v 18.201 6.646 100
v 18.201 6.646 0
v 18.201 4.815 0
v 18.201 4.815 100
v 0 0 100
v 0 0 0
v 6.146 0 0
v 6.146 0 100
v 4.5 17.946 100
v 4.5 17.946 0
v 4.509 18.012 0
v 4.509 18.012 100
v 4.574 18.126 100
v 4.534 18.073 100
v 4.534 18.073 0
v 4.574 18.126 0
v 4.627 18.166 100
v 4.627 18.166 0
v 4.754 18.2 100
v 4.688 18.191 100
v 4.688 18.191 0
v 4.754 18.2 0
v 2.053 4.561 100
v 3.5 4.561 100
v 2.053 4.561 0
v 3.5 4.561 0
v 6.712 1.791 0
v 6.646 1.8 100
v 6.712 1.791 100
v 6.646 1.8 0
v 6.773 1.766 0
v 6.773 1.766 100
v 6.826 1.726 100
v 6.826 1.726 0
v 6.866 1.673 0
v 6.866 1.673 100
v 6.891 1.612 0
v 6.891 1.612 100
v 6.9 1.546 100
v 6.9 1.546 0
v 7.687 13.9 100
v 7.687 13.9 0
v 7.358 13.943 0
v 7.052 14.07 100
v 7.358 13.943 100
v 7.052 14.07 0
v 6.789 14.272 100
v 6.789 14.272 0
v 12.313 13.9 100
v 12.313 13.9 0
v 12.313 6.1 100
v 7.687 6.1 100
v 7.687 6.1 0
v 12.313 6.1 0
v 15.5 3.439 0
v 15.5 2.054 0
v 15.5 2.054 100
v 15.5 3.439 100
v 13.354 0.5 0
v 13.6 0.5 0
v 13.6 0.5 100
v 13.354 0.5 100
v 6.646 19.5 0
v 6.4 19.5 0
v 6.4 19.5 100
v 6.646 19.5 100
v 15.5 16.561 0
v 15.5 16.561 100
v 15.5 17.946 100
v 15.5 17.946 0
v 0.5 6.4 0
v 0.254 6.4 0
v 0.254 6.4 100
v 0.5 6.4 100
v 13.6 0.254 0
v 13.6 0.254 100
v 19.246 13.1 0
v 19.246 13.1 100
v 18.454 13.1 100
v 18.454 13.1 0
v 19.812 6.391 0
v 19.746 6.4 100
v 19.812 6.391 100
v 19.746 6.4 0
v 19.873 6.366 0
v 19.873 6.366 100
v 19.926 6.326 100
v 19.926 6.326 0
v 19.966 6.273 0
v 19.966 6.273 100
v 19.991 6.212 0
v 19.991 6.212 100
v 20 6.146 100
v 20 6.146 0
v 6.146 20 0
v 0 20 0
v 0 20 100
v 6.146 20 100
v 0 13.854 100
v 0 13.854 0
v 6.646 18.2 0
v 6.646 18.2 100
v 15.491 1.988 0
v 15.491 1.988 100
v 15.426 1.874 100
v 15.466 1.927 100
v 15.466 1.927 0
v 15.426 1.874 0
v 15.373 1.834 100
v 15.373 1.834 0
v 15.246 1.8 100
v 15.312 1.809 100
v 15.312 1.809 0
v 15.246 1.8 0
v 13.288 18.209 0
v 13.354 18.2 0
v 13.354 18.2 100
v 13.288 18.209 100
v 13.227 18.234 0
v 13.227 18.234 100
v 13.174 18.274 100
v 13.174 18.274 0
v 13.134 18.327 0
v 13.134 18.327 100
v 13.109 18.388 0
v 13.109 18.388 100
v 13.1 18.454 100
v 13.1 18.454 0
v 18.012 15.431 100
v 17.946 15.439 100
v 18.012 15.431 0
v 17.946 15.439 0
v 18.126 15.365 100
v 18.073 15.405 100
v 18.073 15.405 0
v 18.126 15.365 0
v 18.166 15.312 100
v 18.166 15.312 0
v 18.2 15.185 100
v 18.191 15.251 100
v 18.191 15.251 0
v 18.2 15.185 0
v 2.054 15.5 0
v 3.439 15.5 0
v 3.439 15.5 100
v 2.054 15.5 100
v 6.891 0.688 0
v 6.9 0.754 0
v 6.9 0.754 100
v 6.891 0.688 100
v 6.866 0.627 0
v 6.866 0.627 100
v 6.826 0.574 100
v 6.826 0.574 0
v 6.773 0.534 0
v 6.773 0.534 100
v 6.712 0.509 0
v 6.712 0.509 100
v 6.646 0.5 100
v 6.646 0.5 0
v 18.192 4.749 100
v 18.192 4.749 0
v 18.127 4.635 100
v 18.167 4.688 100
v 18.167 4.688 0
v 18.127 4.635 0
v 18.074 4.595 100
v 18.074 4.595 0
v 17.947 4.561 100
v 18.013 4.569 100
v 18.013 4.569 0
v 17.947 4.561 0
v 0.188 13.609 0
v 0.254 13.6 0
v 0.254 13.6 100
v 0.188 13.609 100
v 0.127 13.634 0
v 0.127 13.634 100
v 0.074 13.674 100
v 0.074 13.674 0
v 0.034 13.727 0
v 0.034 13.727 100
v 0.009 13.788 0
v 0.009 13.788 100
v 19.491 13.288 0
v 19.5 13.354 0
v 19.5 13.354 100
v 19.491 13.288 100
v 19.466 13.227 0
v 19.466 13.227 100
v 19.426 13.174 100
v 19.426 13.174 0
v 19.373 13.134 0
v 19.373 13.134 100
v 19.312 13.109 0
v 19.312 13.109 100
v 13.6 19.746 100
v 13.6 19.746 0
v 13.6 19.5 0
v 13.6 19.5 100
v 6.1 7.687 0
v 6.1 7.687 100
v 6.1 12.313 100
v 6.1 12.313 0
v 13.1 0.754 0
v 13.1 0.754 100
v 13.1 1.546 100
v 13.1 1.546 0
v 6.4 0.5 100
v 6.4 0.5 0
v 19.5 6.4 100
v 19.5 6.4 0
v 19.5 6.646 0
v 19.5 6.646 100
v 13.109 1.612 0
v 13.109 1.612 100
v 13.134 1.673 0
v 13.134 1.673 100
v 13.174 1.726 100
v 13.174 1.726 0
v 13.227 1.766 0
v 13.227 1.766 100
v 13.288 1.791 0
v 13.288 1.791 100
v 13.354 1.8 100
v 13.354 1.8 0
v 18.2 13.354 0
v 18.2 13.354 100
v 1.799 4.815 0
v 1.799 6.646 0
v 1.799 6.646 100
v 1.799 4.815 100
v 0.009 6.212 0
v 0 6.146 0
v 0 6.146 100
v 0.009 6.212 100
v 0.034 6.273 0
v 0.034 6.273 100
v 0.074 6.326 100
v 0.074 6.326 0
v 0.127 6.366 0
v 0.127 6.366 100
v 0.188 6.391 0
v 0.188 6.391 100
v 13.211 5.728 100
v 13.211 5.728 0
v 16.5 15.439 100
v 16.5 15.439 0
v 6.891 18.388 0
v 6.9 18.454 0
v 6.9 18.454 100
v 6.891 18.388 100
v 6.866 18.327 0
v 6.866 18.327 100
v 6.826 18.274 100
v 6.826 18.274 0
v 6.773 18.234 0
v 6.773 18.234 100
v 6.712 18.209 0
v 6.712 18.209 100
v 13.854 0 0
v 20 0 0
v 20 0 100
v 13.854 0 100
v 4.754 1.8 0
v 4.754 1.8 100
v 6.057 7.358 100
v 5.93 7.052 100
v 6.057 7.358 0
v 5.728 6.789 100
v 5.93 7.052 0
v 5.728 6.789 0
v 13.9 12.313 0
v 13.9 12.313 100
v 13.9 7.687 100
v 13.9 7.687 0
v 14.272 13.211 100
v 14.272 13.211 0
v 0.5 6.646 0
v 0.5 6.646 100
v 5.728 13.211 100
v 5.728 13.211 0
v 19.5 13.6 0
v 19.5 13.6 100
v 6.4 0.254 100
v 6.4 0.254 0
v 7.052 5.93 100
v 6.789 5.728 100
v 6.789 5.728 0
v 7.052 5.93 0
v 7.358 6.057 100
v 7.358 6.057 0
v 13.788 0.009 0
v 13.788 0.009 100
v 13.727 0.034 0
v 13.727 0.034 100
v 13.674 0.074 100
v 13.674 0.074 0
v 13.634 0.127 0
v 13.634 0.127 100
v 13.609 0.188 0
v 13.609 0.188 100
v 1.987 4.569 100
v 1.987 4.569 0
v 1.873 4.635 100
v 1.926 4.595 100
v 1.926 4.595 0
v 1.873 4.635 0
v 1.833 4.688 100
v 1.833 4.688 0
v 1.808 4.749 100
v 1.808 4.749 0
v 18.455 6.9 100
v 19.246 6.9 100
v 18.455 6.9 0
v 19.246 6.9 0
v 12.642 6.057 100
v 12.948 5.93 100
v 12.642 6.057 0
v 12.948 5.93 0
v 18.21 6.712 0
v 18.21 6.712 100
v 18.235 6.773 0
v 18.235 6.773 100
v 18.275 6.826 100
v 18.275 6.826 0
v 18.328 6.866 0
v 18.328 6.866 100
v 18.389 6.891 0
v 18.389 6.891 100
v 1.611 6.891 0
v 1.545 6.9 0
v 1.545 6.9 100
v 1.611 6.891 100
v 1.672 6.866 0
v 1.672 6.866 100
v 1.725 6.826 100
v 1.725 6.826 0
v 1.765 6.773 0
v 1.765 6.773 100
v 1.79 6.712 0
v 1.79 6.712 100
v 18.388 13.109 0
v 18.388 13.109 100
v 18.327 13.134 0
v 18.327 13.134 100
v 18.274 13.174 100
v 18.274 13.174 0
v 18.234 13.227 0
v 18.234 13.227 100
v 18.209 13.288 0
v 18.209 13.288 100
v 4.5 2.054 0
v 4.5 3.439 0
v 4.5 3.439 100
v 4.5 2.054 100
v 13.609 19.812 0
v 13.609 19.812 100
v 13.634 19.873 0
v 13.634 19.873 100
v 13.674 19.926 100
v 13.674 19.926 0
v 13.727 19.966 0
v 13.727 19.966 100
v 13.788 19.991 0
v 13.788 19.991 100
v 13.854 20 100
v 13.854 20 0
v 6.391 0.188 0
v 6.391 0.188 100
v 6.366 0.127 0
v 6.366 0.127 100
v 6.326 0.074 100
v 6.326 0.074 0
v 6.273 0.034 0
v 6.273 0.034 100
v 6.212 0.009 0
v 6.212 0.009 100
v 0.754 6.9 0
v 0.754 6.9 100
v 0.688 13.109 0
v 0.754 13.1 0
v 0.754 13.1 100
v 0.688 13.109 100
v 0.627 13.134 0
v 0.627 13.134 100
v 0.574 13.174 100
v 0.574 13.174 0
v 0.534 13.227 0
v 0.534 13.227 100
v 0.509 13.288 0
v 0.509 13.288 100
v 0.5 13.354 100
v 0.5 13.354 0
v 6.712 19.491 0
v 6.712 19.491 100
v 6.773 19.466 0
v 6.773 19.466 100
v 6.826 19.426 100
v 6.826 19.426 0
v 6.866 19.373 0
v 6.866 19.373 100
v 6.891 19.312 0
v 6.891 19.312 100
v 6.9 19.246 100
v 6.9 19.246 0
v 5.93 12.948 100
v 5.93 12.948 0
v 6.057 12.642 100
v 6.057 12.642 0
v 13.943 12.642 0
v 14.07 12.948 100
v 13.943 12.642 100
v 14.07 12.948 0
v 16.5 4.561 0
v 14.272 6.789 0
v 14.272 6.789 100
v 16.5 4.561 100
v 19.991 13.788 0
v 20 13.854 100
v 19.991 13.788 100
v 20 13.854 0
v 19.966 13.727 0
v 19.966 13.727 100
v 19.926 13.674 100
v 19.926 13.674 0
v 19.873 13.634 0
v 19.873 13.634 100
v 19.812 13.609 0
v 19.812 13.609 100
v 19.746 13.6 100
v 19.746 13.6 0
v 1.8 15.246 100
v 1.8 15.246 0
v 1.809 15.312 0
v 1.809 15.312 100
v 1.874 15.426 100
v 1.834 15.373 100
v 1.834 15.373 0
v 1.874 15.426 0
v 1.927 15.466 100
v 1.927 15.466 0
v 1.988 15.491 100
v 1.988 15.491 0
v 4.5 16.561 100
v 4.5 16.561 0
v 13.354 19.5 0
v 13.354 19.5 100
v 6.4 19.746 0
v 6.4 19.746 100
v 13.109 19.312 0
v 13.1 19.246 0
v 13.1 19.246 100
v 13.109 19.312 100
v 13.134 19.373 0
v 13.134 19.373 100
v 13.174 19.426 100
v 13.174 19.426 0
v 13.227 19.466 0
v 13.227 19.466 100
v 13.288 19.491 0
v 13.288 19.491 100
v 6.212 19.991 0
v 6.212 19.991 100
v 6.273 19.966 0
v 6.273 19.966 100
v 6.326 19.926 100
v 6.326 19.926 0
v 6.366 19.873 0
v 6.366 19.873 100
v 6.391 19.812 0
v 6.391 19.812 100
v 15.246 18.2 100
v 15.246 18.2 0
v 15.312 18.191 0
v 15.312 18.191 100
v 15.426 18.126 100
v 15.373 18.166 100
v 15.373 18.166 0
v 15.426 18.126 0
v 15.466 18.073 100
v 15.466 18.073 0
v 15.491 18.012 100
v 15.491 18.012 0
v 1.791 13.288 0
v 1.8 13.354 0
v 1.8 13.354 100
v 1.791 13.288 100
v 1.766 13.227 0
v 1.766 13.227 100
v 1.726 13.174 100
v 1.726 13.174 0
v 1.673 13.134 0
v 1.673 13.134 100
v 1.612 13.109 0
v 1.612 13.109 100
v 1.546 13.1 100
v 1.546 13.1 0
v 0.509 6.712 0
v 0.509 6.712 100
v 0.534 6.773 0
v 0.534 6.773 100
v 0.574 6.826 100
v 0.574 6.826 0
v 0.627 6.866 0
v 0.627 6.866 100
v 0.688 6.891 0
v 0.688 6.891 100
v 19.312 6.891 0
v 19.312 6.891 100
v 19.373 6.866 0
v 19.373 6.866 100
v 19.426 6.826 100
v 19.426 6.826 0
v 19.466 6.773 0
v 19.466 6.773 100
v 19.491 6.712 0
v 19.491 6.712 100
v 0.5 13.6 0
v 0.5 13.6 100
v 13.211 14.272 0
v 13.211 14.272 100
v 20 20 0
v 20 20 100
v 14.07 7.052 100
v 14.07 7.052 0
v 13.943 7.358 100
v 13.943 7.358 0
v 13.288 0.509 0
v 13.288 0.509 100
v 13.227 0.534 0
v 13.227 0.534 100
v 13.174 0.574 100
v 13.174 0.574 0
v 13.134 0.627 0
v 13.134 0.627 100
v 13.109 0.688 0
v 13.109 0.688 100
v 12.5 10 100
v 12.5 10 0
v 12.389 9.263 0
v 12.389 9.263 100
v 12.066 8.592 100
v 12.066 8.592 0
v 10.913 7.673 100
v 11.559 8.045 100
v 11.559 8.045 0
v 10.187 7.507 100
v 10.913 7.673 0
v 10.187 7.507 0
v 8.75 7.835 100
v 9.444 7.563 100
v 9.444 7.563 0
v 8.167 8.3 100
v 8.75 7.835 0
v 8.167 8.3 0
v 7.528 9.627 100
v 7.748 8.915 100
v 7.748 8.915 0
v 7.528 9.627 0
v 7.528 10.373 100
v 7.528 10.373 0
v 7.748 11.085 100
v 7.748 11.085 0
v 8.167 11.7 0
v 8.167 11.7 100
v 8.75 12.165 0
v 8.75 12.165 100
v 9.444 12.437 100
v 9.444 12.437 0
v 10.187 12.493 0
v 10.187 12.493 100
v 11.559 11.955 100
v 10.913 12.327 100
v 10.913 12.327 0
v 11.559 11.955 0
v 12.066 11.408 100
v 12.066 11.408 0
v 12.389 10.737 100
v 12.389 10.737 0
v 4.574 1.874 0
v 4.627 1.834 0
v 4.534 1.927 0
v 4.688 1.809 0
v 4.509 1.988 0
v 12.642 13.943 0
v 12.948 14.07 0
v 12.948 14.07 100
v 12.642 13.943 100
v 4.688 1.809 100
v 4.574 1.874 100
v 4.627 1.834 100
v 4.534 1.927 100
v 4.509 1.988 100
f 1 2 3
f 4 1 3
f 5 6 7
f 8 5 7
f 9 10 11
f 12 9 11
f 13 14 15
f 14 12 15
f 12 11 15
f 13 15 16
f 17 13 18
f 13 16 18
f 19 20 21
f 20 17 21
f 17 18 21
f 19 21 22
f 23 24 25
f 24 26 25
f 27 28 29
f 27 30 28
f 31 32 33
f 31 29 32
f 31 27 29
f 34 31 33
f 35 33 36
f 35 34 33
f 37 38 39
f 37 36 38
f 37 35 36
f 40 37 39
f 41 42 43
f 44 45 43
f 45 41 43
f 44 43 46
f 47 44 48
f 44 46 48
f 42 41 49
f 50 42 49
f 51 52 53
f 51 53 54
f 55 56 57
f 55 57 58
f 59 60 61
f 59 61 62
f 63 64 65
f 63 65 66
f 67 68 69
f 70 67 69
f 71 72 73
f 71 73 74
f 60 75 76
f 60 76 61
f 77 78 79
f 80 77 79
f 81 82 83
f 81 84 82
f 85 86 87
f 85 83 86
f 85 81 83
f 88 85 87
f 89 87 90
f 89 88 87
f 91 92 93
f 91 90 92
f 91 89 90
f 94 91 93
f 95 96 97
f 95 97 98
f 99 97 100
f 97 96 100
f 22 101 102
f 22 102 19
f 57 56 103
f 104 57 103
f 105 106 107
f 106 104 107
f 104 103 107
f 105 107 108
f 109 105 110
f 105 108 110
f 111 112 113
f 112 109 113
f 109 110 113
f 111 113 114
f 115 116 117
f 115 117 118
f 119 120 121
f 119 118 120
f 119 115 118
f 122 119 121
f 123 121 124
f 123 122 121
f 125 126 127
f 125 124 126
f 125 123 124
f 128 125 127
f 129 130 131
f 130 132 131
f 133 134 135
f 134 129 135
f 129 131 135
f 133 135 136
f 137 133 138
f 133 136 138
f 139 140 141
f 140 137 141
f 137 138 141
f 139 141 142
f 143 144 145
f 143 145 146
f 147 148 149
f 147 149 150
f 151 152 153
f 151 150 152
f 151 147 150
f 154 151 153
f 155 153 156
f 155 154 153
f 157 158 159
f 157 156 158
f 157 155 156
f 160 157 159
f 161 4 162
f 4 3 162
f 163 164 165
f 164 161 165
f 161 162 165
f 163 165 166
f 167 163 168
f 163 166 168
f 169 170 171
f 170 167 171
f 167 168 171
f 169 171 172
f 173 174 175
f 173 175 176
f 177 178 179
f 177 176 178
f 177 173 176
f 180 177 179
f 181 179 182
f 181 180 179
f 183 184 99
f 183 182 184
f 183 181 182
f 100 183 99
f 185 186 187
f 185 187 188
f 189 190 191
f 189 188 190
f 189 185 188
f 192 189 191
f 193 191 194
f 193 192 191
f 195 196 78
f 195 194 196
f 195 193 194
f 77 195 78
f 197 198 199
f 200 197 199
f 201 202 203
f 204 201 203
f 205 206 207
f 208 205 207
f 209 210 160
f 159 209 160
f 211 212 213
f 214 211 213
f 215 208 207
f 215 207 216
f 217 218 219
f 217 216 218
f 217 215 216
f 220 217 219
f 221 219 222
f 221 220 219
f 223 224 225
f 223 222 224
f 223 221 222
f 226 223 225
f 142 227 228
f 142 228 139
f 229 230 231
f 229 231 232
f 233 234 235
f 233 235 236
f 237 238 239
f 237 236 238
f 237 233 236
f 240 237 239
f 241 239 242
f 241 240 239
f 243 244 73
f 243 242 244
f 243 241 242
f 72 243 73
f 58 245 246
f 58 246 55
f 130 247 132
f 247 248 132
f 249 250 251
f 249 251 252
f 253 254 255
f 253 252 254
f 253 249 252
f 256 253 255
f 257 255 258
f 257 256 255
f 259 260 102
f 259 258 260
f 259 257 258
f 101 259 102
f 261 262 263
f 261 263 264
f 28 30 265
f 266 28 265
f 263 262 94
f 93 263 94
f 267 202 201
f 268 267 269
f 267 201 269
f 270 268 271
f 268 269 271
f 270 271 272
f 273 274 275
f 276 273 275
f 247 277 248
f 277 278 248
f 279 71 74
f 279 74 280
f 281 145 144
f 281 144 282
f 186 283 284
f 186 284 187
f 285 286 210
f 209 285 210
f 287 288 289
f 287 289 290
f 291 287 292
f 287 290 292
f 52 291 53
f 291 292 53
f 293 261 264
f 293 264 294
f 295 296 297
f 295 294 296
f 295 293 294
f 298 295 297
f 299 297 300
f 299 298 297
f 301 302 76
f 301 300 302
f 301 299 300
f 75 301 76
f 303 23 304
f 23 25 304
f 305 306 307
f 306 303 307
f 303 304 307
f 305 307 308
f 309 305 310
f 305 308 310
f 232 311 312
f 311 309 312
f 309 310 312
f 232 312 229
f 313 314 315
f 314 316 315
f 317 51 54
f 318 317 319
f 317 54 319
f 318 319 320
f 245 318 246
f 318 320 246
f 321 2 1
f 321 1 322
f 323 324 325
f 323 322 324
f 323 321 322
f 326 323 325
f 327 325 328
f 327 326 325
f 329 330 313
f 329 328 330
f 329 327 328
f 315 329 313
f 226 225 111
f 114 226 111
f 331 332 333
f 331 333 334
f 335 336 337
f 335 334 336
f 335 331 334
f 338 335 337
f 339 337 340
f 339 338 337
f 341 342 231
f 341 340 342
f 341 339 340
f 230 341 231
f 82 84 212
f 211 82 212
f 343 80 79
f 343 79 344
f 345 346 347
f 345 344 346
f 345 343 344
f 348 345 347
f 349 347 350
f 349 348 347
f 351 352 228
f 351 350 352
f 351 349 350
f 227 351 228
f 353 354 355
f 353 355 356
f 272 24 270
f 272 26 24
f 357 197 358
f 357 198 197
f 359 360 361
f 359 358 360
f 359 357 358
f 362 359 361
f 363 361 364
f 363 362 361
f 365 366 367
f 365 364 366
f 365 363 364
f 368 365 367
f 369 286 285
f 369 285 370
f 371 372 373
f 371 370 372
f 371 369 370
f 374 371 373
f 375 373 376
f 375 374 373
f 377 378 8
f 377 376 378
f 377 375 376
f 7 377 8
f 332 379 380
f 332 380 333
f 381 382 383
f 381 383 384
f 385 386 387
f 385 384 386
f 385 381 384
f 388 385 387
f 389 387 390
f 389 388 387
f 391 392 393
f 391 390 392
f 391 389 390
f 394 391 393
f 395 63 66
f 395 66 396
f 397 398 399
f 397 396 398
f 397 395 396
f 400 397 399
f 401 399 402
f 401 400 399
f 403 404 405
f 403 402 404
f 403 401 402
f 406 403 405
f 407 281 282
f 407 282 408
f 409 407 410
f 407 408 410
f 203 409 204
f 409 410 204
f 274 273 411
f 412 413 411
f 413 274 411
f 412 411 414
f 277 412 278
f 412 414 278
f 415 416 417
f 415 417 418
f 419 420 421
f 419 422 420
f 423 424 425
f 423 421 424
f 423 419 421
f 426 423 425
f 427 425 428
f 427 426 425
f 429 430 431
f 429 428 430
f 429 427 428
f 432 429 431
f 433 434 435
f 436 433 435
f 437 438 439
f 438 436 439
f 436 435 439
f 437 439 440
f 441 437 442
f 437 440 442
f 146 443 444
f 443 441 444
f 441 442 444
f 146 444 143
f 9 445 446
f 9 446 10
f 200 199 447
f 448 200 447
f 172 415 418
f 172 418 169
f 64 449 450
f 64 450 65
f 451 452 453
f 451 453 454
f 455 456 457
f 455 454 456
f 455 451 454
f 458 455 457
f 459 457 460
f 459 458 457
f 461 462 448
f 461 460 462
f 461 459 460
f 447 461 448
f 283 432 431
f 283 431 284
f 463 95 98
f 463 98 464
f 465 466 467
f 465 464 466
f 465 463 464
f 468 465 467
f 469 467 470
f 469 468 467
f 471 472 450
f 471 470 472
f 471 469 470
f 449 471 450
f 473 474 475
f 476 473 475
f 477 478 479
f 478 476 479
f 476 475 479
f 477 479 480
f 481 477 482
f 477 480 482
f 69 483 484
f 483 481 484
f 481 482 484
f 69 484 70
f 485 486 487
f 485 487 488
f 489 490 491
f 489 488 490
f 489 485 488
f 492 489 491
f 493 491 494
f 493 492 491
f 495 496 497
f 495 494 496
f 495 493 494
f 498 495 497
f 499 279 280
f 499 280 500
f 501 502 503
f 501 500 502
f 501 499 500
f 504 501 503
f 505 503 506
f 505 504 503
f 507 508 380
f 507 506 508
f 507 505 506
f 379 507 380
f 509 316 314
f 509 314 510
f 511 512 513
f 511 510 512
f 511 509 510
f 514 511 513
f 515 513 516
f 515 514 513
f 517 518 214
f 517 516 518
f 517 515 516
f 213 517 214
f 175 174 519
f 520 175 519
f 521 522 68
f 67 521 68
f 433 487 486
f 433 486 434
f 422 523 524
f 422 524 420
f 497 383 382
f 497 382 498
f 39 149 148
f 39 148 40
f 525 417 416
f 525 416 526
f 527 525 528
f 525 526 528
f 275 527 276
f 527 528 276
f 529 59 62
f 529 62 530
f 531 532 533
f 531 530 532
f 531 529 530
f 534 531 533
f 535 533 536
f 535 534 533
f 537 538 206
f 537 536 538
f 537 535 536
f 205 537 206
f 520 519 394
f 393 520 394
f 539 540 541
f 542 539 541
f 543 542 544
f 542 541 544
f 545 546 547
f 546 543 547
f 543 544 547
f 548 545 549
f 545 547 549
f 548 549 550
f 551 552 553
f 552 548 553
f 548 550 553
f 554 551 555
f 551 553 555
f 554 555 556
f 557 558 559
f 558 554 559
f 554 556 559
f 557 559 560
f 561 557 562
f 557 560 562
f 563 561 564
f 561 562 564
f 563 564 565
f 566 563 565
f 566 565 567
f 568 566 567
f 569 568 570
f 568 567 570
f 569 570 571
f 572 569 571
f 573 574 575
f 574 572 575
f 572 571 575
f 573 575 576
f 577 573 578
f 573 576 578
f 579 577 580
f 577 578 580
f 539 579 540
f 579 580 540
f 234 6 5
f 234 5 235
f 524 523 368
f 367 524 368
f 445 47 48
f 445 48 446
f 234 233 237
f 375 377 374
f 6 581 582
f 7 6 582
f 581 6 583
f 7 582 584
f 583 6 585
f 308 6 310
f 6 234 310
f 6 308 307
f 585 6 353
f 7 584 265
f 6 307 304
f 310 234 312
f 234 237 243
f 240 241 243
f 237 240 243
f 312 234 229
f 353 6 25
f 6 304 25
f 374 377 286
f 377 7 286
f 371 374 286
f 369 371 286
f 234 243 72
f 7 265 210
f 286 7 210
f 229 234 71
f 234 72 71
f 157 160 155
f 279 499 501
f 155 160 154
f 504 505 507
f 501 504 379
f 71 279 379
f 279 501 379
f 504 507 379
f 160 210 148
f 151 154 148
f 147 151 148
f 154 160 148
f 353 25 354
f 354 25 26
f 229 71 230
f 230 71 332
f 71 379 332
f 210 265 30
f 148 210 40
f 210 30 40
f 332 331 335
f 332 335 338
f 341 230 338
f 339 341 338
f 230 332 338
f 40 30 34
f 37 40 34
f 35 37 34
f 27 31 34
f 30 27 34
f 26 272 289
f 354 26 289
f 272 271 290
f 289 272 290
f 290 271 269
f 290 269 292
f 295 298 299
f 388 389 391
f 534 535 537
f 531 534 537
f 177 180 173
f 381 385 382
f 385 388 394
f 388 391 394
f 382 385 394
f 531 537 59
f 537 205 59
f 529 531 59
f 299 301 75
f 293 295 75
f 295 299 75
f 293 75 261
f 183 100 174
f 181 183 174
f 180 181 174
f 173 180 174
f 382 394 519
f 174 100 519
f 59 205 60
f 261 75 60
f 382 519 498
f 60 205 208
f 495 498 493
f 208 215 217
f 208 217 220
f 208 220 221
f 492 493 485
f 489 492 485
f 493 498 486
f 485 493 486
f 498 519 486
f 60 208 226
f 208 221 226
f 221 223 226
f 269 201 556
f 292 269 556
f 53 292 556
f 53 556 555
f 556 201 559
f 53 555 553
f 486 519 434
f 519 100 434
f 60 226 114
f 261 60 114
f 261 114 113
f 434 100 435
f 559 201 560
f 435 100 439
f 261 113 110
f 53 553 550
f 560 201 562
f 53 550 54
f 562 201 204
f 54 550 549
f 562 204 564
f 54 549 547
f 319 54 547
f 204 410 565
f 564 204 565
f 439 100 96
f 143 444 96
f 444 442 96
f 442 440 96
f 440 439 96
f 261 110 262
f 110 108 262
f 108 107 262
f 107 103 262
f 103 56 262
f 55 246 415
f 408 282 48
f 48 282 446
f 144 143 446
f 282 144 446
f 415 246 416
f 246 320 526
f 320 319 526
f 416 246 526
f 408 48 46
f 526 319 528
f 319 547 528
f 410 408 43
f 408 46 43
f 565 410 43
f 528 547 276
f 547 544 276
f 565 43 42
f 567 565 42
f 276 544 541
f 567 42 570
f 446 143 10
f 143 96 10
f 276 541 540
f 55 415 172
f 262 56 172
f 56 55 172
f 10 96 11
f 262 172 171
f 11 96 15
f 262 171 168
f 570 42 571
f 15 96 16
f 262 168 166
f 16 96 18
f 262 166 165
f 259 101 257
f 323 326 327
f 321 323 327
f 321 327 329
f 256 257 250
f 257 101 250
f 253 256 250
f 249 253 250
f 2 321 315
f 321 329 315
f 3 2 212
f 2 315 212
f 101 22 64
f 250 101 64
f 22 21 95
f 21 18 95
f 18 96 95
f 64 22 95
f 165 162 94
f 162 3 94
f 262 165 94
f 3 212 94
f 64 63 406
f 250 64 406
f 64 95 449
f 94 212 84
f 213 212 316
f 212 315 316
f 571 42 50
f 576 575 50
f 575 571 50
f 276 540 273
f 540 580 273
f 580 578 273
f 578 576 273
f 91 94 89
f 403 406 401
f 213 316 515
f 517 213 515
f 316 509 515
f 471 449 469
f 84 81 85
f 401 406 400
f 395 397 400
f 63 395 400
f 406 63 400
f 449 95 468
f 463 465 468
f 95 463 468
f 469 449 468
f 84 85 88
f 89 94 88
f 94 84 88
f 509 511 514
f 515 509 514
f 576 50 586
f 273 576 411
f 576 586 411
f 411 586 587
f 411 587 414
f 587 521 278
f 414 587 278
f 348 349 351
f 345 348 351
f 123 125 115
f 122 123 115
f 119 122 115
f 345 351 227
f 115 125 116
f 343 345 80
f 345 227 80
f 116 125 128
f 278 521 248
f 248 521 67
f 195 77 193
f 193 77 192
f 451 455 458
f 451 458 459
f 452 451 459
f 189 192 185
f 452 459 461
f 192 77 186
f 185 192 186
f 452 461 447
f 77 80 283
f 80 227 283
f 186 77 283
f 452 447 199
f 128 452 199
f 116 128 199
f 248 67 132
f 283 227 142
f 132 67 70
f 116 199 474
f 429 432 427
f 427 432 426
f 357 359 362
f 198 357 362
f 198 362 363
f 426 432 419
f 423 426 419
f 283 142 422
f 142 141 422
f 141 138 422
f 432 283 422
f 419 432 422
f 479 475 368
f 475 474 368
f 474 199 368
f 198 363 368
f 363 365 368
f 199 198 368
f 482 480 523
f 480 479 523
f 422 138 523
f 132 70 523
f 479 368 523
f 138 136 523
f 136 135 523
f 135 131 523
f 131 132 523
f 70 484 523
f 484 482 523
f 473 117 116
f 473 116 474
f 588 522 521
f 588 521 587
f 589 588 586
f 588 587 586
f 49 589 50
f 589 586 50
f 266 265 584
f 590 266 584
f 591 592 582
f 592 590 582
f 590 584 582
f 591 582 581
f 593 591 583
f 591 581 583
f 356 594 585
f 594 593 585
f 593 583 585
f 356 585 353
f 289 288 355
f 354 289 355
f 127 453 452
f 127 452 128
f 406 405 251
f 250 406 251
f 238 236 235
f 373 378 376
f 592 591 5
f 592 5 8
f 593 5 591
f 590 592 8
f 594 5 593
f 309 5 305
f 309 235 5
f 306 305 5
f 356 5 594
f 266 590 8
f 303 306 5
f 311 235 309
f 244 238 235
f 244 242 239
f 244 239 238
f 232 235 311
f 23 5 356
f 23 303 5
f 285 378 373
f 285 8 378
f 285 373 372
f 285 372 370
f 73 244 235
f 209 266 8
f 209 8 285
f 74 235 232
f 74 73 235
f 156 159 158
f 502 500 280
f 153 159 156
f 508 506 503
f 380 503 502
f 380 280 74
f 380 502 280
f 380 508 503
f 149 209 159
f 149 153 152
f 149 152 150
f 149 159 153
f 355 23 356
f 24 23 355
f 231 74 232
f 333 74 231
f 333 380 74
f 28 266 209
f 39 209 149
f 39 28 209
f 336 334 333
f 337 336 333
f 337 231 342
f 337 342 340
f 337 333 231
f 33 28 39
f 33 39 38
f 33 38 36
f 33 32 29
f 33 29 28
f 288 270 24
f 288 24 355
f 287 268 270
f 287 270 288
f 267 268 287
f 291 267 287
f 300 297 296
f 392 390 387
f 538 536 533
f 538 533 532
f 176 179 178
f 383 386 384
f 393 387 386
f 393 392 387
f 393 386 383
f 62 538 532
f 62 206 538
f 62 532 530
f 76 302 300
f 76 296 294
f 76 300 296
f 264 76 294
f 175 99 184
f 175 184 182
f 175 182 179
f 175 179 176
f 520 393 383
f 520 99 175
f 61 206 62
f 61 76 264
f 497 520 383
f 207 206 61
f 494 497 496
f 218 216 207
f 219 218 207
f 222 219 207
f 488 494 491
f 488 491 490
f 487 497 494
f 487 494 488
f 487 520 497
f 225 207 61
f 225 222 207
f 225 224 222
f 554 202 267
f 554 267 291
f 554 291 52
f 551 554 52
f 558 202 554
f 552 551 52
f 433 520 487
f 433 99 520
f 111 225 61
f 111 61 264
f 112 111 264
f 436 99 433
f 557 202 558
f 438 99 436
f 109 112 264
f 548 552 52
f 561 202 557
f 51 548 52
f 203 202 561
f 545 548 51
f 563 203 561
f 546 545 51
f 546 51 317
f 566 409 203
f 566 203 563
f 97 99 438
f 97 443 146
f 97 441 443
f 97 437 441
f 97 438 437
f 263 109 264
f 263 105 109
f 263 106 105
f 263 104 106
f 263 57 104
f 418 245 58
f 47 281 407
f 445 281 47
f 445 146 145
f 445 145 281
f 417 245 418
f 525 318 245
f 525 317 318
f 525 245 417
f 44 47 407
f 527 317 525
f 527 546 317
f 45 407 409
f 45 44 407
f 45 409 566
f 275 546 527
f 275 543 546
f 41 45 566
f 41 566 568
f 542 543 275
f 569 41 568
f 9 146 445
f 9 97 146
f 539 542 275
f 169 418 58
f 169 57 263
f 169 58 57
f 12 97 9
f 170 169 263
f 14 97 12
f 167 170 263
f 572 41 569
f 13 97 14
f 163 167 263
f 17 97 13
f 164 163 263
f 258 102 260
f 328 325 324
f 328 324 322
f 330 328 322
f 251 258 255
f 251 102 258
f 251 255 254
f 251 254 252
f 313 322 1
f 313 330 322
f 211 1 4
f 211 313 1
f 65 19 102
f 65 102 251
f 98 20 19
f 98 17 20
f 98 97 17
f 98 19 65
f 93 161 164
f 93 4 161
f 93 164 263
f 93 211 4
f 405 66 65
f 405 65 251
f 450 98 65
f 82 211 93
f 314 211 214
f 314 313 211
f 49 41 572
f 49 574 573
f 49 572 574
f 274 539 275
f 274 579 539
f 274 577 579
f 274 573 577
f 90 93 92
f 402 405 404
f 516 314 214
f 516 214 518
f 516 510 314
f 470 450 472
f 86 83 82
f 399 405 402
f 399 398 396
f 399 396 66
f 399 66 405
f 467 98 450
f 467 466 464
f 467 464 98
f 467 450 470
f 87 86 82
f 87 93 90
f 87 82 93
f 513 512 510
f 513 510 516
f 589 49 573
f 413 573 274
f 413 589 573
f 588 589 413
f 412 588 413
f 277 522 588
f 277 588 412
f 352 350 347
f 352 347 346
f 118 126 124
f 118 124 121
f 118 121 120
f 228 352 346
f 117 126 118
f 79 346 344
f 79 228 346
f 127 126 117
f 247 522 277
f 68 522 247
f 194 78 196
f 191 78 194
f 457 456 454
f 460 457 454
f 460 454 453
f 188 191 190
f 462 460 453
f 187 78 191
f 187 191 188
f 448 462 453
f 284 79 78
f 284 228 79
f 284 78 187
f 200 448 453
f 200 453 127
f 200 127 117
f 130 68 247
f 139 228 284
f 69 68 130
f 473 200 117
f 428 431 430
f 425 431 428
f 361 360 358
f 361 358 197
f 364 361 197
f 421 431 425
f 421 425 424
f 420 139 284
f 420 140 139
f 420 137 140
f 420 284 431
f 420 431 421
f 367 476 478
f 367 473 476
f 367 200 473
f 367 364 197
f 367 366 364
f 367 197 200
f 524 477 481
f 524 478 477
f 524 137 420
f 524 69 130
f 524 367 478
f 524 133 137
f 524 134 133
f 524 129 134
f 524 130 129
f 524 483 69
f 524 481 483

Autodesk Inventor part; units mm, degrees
ref_plane "YZ Plane" through (0, 0, 0) normal (1, 0, 0) x (0, 1, 0)
ref_plane "XZ Plane" through (0, 0, 0) normal (0, 1, 0) x (-1, 0, 0)
ref_plane "XY Plane" through (0, 0, 0) normal (0, 0, 1) x (1, 0, 0)
sketch "Sketch1" plane through (0, 0, 0) normal (0, 0, 1) x (1, 0, 0)
  line L0 (0, 0) -> (6.146, 0)
  line L1 (6.4, 0.254) -> (6.4, 0.5)
  line L2 (6.4, 0.5) -> (6.646, 0.5)
  line L3 (6.9, 0.754) -> (6.9, 1.546)
  line L4 (0, 0) -> (0, 6.146)
  line L5 (0.254, 6.4) -> (0.5, 6.4)
  line L6 (0.5, 6.4) -> (0.5, 6.646)
  line L7 (0.754, 6.9) -> (1.5449, 6.9)
  line L8 (1.7989, 6.646) -> (1.7989, 4.8147)
  line L9 (6.646, 1.8) -> (4.754, 1.8)
  line L10 (20, 0) -> (20, 6.146)
  line L11 (19.746, 6.4) -> (19.5, 6.4)
  line L12 (19.5, 6.4) -> (19.5, 6.646)
  line L13 (19.246, 6.9) -> (18.4551, 6.9)
  line L14 (18.2011, 6.646) -> (18.2011, 4.8147)
  line L15 (20, 0) -> (13.854, 0)
  line L16 (13.6, 0.254) -> (13.6, 0.5)
  circle A0 centre (10, 10) radius 2.5
  line L17 (20, 20) -> (13.854, 20)
  line L18 (20, 20) -> (20, 13.854)
  line L19 (19.746, 13.6) -> (19.5, 13.6)
  line L20 (19.5, 13.6) -> (19.5, 13.354)
  line L21 (19.246, 13.1) -> (18.454, 13.1)
  line L22 (13.6, 19.746) -> (13.6, 19.5)
  line L23 (13.6, 19.5) -> (13.354, 19.5)
  line L24 (13.1, 19.246) -> (13.1, 18.454)
  line L25 (13.354, 18.2) -> (15.246, 18.2)
  line L26 (0, 20) -> (6.146, 20)
  line L27 (6.4, 19.746) -> (6.4, 19.5)
  line L28 (6.4, 19.5) -> (6.646, 19.5)
  line L29 (6.9, 19.246) -> (6.9, 18.454)
  line L30 (6.646, 18.2) -> (4.754, 18.2)
  line L31 (0, 20) -> (0, 13.854)
  line L32 (0.254, 13.6) -> (0.5, 13.6)
  line L33 (0.5, 13.6) -> (0.5, 13.354)
  line L34 (0.754, 13.1) -> (1.546, 13.1)
  line L35 (1.8, 13.354) -> (1.8, 15.246)
  line L36 (3.4393, 15.5) -> (2.054, 15.5)
  line L37 (4.5, 16.5607) -> (4.5, 17.946)
  line L38 (16.5, 4.5607) -> (17.9471, 4.5607)
  line L39 (13.6, 0.5) -> (13.354, 0.5)
  line L40 (13.1, 0.754) -> (13.1, 1.546)
  line L41 (13.354, 1.8) -> (15.246, 1.8)
  line L42 (15.5, 2.054) -> (15.5, 3.4393)
  line L43 (15.5, 16.5607) -> (15.5, 17.946)
  line L44 (16.5, 15.4393) -> (17.946, 15.4393)
  line L45 (4.5, 3.4393) -> (4.5, 2.054)
  line L46 (3.5, 4.5607) -> (2.0529, 4.5607)
  line L47 (6.1, 7.6867) -> (6.1, 12.3133)
  line L48 (3.5, 4.5607) -> (5.728, 6.7887)
  line L49 (3.4393, 15.5) -> (5.728, 13.2113)
  line L50 (7.6867, 13.9) -> (12.3133, 13.9)
  line L51 (6.7887, 14.272) -> (4.5, 16.5607)
  line L52 (13.2113, 14.272) -> (15.5, 16.5607)
  line L53 (13.9, 12.3133) -> (13.9, 7.6867)
  line L54 (14.272, 6.7887) -> (16.5, 4.5607)
  line L55 (14.272, 13.2113) -> (16.5, 15.4393)
  line L56 (7.6867, 6.1) -> (12.3133, 6.1)
  line L57 (6.7887, 5.728) -> (4.5, 3.4393)
  line L58 (13.2113, 5.728) -> (15.5, 3.4393)
  arc A1 (6.9, 19.246) -> (6.646, 19.5) centre (6.646, 19.246) ccw
  arc A2 (6.4, 19.746) -> (6.146, 20) centre (6.146, 19.746) ccw
  arc A3 (6.646, 18.2) -> (6.9, 18.454) centre (6.646, 18.454) ccw
  arc A4 (4.754, 18.2) -> (4.5, 17.946) centre (4.754, 17.946) ccw
  arc A5 (13.1, 18.454) -> (13.354, 18.2) centre (13.354, 18.454) ccw
  arc A6 (13.354, 19.5) -> (13.1, 19.246) centre (13.354, 19.246) ccw
  arc A7 (13.854, 20) -> (13.6, 19.746) centre (13.854, 19.746) ccw
  arc A8 (15.5, 17.946) -> (15.246, 18.2) centre (15.246, 17.946) ccw
  arc A9 (2.054, 15.5) -> (1.8, 15.246) centre (2.054, 15.246) ccw
  arc A10 (0.5, 13.354) -> (0.754, 13.1) centre (0.754, 13.354) ccw
  arc A11 (0, 13.854) -> (0.254, 13.6) centre (0.254, 13.854) ccw
  arc A12 (1.546, 13.1) -> (1.8, 13.354) centre (1.546, 13.354) ccw
  arc A13 (0.254, 6.4) -> (0, 6.146) centre (0.254, 6.146) ccw
  arc A14 (0.754, 6.9) -> (0.5, 6.646) centre (0.754, 6.646) ccw
  arc A15 (1.7989, 6.646) -> (1.5449, 6.9) centre (1.5449, 6.646) ccw
  arc A16 (1.7989, 4.8147) -> (2.0529, 4.5607) centre (2.0529, 4.8147) ccw
  arc A17 (19.746, 13.6) -> (20, 13.854) centre (19.746, 13.854) ccw
  arc A18 (19.246, 13.1) -> (19.5, 13.354) centre (19.246, 13.354) ccw
  arc A19 (18.2, 13.354) -> (18.454, 13.1) centre (18.454, 13.354) ccw
  line L59 (18.2, 13.354) -> (18.2, 15.1853)
  arc A20 (18.2, 15.1853) -> (17.946, 15.4393) centre (17.946, 15.1853) ccw
  arc A21 (20, 6.146) -> (19.746, 6.4) centre (19.746, 6.146) ccw
  arc A22 (19.5, 6.646) -> (19.246, 6.9) centre (19.246, 6.646) ccw
  arc A23 (18.4551, 6.9) -> (18.2011, 6.646) centre (18.4551, 6.646) ccw
  arc A24 (17.9471, 4.5607) -> (18.2011, 4.8147) centre (17.9471, 4.8147) ccw
  arc A25 (13.6, 0.254) -> (13.854, 0) centre (13.854, 0.254) ccw
  arc A26 (13.1, 0.754) -> (13.354, 0.5) centre (13.354, 0.754) ccw
  arc A27 (13.354, 1.8) -> (13.1, 1.546) centre (13.354, 1.546) ccw
  arc A28 (15.246, 1.8) -> (15.5, 2.054) centre (15.246, 2.054) ccw
  arc A29 (6.146, 0) -> (6.4, 0.254) centre (6.146, 0.254) ccw
  arc A30 (6.646, 0.5) -> (6.9, 0.754) centre (6.646, 0.754) ccw
  arc A31 (6.9, 1.546) -> (6.646, 1.8) centre (6.646, 1.546) ccw
  arc A32 (4.5, 2.054) -> (4.754, 1.8) centre (4.754, 2.054) ccw
  arc A33 (6.7887, 14.272) -> (7.6867, 13.9) centre (7.6867, 15.17) ccw
  arc A34 (12.3133, 13.9) -> (13.2113, 14.272) centre (12.3133, 15.17) ccw
  arc A35 (6.1, 12.3133) -> (5.728, 13.2113) centre (4.83, 12.3133) ccw
  arc A36 (5.728, 6.7887) -> (6.1, 7.6867) centre (4.83, 7.6867) ccw
  arc A37 (7.6867, 6.1) -> (6.7887, 5.728) centre (7.6867, 4.83) ccw
  arc A38 (13.2113, 5.728) -> (12.3133, 6.1) centre (12.3133, 4.83) ccw
  arc A39 (13.9, 7.6867) -> (14.272, 6.7887) centre (15.17, 7.6867) ccw
  arc A40 (14.272, 13.2113) -> (13.9, 12.3133) centre (15.17, 12.3133) ccw
  point P0 (20, 6.4)
  point P1 (19.5, 6.9)
  point P2 (18.2011, 6.9)
  dimension "d59" = 1.27
extrude "Extrusion1" add sketch "Sketch1" along normal blind 100
properties part number "T slot beam 20mm Dist_40mm"
